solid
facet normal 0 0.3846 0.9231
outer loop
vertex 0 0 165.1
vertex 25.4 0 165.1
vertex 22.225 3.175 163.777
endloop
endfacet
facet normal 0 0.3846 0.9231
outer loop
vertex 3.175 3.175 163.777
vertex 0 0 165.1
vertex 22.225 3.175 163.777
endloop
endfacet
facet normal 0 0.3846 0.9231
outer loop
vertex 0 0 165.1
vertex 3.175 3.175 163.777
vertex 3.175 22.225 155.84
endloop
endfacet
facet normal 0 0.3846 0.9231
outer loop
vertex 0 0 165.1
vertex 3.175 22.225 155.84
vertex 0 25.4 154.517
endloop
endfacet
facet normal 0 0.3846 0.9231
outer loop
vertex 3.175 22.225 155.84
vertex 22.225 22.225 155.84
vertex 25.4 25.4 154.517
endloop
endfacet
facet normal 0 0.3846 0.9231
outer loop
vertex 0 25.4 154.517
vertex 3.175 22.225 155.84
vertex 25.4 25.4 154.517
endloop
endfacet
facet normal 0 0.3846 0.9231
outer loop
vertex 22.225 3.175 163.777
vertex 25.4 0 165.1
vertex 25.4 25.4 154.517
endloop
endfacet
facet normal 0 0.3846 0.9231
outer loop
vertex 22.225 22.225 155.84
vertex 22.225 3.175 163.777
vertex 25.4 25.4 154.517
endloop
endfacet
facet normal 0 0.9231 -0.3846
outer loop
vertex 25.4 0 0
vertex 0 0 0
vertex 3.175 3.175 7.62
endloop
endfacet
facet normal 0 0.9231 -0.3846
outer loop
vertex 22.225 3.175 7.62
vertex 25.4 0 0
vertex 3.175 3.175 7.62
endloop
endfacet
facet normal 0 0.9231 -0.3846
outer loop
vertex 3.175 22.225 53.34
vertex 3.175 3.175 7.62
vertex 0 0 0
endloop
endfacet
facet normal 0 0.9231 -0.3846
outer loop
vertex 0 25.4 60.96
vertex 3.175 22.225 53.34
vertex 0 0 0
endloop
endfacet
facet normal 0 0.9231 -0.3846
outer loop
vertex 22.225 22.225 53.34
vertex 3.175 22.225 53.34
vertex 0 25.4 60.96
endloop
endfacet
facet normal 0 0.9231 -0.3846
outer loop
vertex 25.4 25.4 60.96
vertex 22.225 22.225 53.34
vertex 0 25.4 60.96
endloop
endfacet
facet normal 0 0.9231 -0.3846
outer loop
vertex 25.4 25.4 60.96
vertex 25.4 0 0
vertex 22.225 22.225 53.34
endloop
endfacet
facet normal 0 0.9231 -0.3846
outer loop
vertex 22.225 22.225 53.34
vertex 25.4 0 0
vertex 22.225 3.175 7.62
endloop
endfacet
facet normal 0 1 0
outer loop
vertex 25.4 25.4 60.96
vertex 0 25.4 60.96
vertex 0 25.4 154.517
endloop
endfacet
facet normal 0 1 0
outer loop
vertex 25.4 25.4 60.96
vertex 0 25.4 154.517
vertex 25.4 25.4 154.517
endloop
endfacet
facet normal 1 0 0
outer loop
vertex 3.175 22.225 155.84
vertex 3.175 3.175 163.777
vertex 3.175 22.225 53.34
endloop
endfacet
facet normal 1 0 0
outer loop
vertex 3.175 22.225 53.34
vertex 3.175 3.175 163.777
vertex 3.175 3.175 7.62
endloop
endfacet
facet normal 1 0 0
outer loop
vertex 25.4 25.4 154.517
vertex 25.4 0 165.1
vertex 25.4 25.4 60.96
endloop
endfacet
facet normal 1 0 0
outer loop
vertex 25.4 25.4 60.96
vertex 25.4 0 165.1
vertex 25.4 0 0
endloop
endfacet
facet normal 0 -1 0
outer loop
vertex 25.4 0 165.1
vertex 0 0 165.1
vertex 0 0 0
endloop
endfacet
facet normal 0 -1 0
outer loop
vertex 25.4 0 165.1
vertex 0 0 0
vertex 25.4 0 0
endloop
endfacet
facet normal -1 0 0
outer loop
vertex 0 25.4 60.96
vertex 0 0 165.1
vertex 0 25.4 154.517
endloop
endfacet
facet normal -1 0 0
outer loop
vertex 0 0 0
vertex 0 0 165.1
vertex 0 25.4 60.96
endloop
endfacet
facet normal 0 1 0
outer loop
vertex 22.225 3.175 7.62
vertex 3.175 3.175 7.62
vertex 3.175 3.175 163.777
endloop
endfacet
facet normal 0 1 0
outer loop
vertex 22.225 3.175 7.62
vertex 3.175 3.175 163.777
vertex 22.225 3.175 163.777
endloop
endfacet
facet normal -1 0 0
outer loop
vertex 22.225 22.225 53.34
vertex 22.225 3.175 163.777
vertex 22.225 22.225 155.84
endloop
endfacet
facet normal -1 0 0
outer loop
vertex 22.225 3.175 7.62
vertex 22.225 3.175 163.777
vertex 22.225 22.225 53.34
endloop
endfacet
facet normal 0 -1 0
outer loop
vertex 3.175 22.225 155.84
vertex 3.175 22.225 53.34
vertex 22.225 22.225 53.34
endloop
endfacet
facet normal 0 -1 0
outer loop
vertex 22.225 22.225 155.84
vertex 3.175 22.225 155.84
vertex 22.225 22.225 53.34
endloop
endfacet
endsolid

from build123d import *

# Parameters (mm, degrees)
SKETCH1_W           = 25.4
SKETCH1_H           = 25.4
SKETCH1_W_2         = 19.05
SKETCH1_H_2         = 19.05
BOSS_EXTRUDE2_DEPTH = 165.1
CUT_EXTRUDE1_REACH  = 170.963


with BuildPart() as part:
    # Sketch1 → Boss-Extrude2 (new body)
    with BuildSketch(Plane.XY):
        with Locations((12.7, 12.7)):
            Rectangle(SKETCH1_W, SKETCH1_H)
        with Locations((12.7, 12.7)):
            Rectangle(SKETCH1_W_2, SKETCH1_H_2, mode=Mode.SUBTRACT)
    extrude(amount=BOSS_EXTRUDE2_DEPTH)

    # Cut-Extrude1: up to this face of the body (flat: up to its plane)
    cut_extrude1_end = Plane(part.part.faces().sort_by_distance((0, 12.7, 82.55))[0])
    # Sketch3 → Cut-Extrude1 (cut, up to the picked face)
    with BuildSketch(Plane(origin=(25.4, 0, 0), x_dir=(0, 0, -1), z_dir=(1, 0, 0)), mode=Mode.PRIVATE) as cut_extrude1_sk1:
        Polygon((-165.1, 0), (-154.516596402, 25.4), (-165.1, 25.4), align=None)
    cut_extrude1_tool1 = split(extrude(cut_extrude1_sk1.sketch, amount=-CUT_EXTRUDE1_REACH, mode=Mode.PRIVATE), bisect_by=cut_extrude1_end, keep=Keep.BOTH, mode=Mode.PRIVATE)
    # Sketch3 → Cut-Extrude1 (cut, up to the picked face)
    with BuildSketch(Plane(origin=(25.4, 0, 0), x_dir=(0, 0, -1), z_dir=(1, 0, 0)), mode=Mode.PRIVATE) as cut_extrude1_sk2:
        Polygon((0, 0), (-60.959595279, 25.4), (0, 25.4), align=None)
    cut_extrude1_tool2 = split(extrude(cut_extrude1_sk2.sketch, amount=-CUT_EXTRUDE1_REACH, mode=Mode.PRIVATE), bisect_by=cut_extrude1_end, keep=Keep.BOTH, mode=Mode.PRIVATE)
    add(cut_extrude1_tool1.solids().sort_by(Axis((25.4, 16.933333, 161.572199), (-1, 0, 0)))[0], mode=Mode.SUBTRACT)
    add(cut_extrude1_tool2.solids().sort_by(Axis((25.4, 16.933333, 20.319865), (-1, 0, 0)))[0], mode=Mode.SUBTRACT)


solid = part.part
